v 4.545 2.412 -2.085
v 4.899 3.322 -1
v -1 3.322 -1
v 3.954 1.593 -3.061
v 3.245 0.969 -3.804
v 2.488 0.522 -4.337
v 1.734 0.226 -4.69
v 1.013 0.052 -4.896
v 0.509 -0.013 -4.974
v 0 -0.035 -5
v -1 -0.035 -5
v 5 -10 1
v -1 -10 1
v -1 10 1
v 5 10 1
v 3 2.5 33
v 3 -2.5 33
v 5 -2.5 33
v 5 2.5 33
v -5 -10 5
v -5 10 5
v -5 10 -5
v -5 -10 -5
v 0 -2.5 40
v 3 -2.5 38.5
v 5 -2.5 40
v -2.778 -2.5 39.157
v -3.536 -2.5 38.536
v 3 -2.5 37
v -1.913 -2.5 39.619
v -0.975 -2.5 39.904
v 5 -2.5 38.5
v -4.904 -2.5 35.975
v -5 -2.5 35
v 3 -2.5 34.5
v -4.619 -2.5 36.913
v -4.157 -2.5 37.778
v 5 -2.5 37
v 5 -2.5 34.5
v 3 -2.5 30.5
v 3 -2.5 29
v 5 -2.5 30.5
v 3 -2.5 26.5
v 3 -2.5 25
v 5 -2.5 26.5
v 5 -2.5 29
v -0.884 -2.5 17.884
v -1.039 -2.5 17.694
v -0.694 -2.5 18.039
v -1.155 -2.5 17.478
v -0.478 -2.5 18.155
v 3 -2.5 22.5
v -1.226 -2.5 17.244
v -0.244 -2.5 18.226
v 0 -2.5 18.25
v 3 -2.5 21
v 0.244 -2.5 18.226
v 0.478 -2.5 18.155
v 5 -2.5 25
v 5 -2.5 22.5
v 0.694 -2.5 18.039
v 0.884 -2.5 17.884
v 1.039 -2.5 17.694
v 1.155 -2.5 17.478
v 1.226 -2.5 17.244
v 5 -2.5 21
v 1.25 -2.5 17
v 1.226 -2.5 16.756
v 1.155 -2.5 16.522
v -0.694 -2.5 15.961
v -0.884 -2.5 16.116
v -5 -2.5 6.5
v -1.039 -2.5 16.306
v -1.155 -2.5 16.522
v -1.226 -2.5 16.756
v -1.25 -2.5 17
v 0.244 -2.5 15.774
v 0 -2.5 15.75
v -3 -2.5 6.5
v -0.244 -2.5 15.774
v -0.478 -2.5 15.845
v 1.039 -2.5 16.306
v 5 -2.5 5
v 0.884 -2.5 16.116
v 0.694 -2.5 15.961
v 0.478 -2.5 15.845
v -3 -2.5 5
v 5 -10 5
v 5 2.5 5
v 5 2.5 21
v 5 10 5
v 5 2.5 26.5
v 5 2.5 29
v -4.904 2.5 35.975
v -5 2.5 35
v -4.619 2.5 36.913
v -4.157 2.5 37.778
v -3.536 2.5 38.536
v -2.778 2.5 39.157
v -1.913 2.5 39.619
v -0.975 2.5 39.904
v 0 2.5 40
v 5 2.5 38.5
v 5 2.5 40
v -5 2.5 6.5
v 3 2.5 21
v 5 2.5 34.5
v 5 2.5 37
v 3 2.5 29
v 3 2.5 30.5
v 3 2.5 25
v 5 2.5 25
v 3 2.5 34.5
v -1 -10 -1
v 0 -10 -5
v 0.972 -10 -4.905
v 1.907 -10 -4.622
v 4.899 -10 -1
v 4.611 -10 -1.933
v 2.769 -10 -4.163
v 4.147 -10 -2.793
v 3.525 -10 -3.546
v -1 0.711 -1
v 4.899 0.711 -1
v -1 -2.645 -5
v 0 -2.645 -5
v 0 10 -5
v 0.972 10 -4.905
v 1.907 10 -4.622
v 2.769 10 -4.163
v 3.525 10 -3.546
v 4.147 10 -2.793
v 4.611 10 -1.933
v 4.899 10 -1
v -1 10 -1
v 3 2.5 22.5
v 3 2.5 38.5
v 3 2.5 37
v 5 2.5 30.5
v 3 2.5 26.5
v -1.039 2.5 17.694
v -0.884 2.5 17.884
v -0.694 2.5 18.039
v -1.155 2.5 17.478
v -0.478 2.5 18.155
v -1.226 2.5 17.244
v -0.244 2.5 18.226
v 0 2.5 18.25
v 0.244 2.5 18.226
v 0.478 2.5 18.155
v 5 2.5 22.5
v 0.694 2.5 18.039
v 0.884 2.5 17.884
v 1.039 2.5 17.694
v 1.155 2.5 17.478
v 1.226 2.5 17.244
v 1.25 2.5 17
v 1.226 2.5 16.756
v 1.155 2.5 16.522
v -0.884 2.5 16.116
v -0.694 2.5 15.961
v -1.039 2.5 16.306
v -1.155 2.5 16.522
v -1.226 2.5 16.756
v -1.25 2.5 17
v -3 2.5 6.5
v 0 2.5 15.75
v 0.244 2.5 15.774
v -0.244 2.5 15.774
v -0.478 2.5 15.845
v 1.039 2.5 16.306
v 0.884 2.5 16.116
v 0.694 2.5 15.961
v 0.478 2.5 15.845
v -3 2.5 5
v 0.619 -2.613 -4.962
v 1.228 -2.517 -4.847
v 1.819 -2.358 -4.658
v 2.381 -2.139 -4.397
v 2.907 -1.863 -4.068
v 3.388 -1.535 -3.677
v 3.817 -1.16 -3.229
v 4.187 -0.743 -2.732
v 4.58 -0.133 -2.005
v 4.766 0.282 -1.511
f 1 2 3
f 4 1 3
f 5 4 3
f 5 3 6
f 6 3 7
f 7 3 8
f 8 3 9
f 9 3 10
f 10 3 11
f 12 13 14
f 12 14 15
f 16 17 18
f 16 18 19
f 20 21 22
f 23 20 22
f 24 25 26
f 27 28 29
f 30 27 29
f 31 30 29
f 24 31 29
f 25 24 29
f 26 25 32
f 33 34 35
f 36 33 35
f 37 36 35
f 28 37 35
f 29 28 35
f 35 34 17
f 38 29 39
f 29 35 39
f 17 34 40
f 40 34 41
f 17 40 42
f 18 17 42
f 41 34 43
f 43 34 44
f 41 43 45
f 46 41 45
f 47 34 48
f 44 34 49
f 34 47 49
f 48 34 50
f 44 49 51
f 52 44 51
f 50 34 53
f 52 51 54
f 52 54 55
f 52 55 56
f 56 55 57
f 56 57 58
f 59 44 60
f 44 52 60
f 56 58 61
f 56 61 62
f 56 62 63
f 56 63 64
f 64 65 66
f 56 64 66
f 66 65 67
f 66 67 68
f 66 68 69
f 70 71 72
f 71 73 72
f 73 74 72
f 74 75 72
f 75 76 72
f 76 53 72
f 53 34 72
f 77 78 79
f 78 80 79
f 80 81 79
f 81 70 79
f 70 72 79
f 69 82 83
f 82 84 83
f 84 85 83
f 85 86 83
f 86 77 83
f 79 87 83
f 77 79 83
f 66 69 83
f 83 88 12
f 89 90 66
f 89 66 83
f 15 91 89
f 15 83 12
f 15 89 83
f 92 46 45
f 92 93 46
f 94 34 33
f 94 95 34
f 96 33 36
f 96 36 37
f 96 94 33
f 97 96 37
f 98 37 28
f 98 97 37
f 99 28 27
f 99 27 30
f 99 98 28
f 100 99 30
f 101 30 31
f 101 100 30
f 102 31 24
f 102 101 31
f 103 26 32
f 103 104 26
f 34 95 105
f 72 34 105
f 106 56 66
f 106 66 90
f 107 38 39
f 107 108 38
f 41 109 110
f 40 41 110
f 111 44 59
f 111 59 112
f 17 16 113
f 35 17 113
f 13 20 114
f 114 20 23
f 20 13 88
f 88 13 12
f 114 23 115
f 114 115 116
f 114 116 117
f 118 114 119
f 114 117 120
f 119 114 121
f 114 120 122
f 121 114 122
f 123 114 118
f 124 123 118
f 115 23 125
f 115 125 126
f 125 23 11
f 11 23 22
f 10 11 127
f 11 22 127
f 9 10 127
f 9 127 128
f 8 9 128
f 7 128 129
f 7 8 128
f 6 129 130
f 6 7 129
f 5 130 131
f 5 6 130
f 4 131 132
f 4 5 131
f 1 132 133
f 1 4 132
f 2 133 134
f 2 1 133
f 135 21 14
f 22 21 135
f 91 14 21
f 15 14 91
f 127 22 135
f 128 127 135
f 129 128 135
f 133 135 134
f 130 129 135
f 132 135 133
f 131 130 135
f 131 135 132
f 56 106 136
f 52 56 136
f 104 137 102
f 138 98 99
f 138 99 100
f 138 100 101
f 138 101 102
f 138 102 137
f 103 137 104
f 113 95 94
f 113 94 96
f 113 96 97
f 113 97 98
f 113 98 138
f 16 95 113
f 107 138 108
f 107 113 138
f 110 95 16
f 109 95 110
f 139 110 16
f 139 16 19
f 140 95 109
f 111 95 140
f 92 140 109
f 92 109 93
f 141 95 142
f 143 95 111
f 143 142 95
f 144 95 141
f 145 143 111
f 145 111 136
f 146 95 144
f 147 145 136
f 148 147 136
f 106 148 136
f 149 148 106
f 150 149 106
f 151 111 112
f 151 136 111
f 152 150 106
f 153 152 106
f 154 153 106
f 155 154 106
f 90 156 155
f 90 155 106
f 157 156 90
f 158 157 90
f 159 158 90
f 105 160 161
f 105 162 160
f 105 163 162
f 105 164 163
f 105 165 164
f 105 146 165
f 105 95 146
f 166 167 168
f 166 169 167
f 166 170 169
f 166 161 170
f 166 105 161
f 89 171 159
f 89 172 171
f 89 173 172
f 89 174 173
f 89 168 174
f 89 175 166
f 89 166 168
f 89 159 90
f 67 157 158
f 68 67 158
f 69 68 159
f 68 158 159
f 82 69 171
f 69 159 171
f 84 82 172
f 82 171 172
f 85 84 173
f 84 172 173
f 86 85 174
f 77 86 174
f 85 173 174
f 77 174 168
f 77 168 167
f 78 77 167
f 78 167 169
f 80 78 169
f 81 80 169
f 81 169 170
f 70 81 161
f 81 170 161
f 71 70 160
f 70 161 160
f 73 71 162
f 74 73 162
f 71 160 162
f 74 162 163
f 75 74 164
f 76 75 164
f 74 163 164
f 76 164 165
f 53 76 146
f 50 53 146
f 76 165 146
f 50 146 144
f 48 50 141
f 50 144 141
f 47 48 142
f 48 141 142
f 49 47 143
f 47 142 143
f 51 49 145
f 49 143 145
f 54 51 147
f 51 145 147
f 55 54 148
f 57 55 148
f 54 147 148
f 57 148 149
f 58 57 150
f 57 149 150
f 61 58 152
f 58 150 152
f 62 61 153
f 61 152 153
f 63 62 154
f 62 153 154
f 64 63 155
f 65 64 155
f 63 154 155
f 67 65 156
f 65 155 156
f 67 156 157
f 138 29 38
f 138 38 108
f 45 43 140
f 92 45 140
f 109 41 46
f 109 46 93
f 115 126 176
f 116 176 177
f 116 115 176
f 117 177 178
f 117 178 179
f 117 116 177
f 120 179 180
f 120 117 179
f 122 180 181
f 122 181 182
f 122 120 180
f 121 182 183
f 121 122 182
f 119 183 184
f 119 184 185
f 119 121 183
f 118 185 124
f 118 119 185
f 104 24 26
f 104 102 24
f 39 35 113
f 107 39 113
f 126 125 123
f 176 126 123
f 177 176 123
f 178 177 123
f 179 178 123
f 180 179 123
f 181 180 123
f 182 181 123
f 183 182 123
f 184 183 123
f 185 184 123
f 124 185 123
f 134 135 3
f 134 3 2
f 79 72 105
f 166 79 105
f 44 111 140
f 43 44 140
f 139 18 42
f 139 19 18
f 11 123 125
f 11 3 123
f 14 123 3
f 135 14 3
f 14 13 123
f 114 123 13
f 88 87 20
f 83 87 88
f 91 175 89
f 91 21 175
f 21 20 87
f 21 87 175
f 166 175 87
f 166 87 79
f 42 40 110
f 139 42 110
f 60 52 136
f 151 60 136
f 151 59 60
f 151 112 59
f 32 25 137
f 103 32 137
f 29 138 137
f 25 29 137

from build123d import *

# Parameters (mm, degrees)
SKETCH1_W            = 10
SKETCH1_H            = 10
BOSS_EXTRUDE1_DEPTH  = 10
SKETCH2_W            = 10
SKETCH2_H            = 5
BOSS_EXTRUDE2_DEPTH  = 35
SKETCH3_R            = 1.25
CUT_EXTRUDE1_DEPTH   = 5
FILLET1_R            = 5
SKETCH4_W            = 6
SKETCH4_H            = 2
CUT_EXTRUDE2_DEPTH   = 20
SKETCH6_W            = 1.5
SKETCH6_H            = 5
CUT_EXTRUDE3_DEPTH   = 2
CUT_EXTRUDE4_DEPTH   = 10
LPATTERN1_COUNT      = 9
LPATTERN1_PITCH      = 4
LPATTERN1_COUNT_DIR2 = 2
LPATTERN1_PITCH_DIR2 = 8


with BuildPart() as part:
    # Sketch1 → Boss-Extrude1 (new body, symmetric)
    with BuildSketch(Plane(origin=(0, 0, 0), x_dir=(1, 0, 0), z_dir=(0, 1, 0))):
        Rectangle(SKETCH1_W, SKETCH1_H)
    extrude(amount=BOSS_EXTRUDE1_DEPTH, both=True)

    # Sketch2 → Boss-Extrude2 (add)
    with BuildSketch(Plane.XY.offset(5)):
        Rectangle(SKETCH2_W, SKETCH2_H)
    extrude(amount=BOSS_EXTRUDE2_DEPTH)

    # Sketch3 → Cut-Extrude1 (cut)
    with BuildSketch(Plane(origin=(0, 2.5, 0), x_dir=(1, 0, 0), z_dir=(0, 1, 0))):
        with Locations((0, -17)):
            Circle(SKETCH3_R)
    extrude(amount=-CUT_EXTRUDE1_DEPTH, mode=Mode.SUBTRACT)

    # Fillet1
    fillet1_edges = [part.edges().sort_by_distance(p)[0] for p in [
        (-5, 0, 40),
        (5, 0, -5),
    ]]
    fillet(fillet1_edges, radius=FILLET1_R)

    # Sketch4 → Cut-Extrude2 (cut)
    with BuildSketch(Plane(origin=(0, 10, 0), x_dir=(1, 0, 0), z_dir=(0, 1, 0))):
        with Locations((2, 0)):
            Rectangle(SKETCH4_W, SKETCH4_H)
    extrude(amount=-CUT_EXTRUDE2_DEPTH, mode=Mode.SUBTRACT)

    # Sketch6 → Cut-Extrude3 (cut)
    with BuildSketch(Plane.ZY.offset(5)):
        with Locations((5.75, 0)):
            Rectangle(SKETCH6_W, SKETCH6_H)
    cut_extrude3 = extrude(amount=-CUT_EXTRUDE3_DEPTH, mode=Mode.SUBTRACT)

    # Sketch7 → Cut-Extrude4 (cut)
    with BuildSketch(Plane(origin=(-1, 0, 0), x_dir=(0, 0, -1), z_dir=(1, 0, 0))):
        Polygon((-1, 5), (11.1033346, -5.155903599), (9.817759381, -6.687992485), (-1, 2.389185421), align=None)
    extrude(amount=CUT_EXTRUDE4_DEPTH, mode=Mode.SUBTRACT)

    # LPattern1: Cut-Extrude3 9 × 2, 12 skipped
    with Locations(*[(j * LPATTERN1_PITCH_DIR2, 0, i * LPATTERN1_PITCH) for i in range(LPATTERN1_COUNT) for j in range(LPATTERN1_COUNT_DIR2) if (i, j) not in ((0, 0), (0, 1), (1, 0), (1, 1), (2, 0), (2, 1), (3, 0), (3, 1), (4, 0), (5, 0), (6, 0), (7, 0), (8, 0))]):
        add(cut_extrude3, mode=Mode.SUBTRACT)


solid = part.part
